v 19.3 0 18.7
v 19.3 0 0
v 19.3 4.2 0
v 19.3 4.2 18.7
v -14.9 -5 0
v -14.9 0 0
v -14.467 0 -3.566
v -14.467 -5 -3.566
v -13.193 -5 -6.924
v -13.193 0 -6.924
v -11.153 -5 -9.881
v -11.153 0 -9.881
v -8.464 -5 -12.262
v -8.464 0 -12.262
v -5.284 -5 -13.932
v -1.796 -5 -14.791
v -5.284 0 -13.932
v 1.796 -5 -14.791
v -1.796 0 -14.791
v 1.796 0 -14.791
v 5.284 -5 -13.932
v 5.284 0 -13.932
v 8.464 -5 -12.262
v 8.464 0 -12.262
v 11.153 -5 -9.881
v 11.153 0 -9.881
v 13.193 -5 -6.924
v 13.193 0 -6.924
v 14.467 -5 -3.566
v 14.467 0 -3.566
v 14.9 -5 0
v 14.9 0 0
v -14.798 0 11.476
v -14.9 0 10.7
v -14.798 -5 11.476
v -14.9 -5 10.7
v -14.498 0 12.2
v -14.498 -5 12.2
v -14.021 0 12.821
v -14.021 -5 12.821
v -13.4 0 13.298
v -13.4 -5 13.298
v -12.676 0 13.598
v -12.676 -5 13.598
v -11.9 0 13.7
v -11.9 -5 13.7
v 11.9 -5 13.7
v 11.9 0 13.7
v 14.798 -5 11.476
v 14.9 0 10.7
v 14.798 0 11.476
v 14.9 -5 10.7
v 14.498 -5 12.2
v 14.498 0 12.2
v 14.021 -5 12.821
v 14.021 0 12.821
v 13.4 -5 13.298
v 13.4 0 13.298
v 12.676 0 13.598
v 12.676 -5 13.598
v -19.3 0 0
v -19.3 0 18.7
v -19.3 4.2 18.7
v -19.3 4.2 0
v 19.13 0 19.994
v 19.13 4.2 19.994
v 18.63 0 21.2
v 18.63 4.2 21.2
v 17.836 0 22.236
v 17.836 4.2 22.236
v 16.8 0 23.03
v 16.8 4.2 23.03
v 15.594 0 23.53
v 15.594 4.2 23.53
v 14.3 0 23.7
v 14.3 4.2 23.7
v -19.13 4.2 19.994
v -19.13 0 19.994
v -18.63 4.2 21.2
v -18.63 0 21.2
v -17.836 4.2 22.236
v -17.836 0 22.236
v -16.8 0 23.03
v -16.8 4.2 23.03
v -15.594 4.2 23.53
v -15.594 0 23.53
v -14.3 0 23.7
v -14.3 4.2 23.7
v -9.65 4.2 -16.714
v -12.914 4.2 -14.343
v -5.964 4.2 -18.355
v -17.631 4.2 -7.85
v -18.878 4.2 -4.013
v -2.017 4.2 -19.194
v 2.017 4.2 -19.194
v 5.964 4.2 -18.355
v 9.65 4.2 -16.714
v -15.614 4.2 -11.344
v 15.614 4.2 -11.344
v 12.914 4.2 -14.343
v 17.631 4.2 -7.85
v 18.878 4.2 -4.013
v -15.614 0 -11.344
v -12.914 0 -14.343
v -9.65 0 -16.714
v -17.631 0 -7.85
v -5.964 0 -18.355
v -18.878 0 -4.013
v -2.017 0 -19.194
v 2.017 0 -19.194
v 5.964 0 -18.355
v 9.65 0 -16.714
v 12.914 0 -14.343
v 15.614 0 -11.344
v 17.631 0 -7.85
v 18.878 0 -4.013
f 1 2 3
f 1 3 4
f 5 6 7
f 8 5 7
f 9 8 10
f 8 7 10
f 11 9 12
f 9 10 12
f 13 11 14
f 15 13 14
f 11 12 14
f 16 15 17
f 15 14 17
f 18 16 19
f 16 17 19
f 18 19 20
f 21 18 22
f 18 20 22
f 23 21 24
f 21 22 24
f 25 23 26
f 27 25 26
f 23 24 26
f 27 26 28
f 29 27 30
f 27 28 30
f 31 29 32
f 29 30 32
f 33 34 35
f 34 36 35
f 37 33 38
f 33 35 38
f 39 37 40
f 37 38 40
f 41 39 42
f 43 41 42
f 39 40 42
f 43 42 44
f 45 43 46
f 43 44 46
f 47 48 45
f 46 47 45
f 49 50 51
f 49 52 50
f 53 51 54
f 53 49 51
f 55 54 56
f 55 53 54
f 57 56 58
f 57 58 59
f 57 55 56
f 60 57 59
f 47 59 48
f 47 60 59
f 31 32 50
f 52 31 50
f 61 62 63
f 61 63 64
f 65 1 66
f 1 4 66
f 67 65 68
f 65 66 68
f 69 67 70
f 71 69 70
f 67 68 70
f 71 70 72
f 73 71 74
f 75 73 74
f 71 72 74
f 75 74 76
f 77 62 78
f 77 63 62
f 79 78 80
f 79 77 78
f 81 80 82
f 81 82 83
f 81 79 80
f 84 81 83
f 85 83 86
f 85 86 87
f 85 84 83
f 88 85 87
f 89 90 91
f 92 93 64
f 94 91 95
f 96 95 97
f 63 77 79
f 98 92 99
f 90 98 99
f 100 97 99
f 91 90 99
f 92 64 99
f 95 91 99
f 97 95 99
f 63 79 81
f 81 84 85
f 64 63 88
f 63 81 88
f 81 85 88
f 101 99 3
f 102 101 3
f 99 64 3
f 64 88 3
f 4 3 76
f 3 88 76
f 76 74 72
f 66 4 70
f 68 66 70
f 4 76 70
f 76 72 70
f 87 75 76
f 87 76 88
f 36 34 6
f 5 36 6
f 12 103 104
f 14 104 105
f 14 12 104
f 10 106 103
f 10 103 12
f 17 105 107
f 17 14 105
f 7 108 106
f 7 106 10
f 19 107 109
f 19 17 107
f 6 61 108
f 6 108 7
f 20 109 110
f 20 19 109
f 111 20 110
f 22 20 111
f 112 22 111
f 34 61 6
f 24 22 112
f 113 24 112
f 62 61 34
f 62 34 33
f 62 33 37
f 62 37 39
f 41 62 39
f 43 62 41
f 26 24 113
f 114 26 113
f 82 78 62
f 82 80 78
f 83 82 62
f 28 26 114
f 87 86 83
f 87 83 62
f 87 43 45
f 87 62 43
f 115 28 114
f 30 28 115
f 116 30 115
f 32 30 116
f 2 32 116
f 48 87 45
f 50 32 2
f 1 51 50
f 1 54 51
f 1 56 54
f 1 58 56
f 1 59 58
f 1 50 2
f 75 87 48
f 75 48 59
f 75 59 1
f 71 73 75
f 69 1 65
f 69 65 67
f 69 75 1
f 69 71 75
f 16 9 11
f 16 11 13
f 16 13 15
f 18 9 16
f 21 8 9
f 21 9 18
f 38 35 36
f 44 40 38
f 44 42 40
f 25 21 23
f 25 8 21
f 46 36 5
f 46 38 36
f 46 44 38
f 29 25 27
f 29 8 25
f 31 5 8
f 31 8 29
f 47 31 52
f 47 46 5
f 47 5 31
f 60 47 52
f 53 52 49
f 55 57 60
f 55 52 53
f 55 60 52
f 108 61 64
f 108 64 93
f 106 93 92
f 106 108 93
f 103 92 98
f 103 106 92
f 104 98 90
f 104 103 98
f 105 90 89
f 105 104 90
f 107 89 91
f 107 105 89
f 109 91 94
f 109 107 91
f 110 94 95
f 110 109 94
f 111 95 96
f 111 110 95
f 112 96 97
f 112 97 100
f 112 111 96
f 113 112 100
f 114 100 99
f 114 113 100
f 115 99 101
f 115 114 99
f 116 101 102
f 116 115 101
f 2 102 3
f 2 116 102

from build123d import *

# Parameters (mm, degrees)
F1_DEPTH = 4.2
F3_DEPTH = 5
F4_R     = 5
F5_R     = 3


with BuildPart() as f1:
    # F0 (on Front) → F1 (new body)
    with BuildSketch(Plane.XZ):
        with BuildLine():
            Line((-19.3, 13.7), (-19.3, 0))
            ThreePointArc((-19.3, 0), (0, -19.3), (19.3, 0))
            Line((19.3, 0), (19.3, 13.7))
            Line((19.3, 13.7), (19.3, 23.7))
            Line((19.3, 23.7), (-19.3, 23.7))
            Line((-19.3, 23.7), (-19.3, 13.7))
        make_face()
    extrude(amount=-F1_DEPTH)

    # F2 (on Front) → F3 (join)
    with BuildSketch(Plane.XZ):
        with BuildLine():
            Line((-14.9, 13.7), (-14.9, 0))
            ThreePointArc((-14.9, 0), (0, -14.9), (14.9, 0))
            Line((14.9, 0), (14.9, 13.7))
            Line((14.9, 13.7), (-14.9, 13.7))
        make_face()
    extrude(amount=F3_DEPTH)

    # F4
    f4_edges = [f1.edges().sort_by_distance(p)[0] for p in [
        (-19.3, 2.1, 23.7),
        (19.3, 2.1, 23.7),
    ]]
    fillet(f4_edges, radius=F4_R)

    # F5
    f5_edges = [f1.edges().sort_by_distance(p)[0] for p in [
        (-14.9, -2.5, 13.7),
        (14.9, -2.5, 13.7),
    ]]
    fillet(f5_edges, radius=F5_R)


solid = f1.part
